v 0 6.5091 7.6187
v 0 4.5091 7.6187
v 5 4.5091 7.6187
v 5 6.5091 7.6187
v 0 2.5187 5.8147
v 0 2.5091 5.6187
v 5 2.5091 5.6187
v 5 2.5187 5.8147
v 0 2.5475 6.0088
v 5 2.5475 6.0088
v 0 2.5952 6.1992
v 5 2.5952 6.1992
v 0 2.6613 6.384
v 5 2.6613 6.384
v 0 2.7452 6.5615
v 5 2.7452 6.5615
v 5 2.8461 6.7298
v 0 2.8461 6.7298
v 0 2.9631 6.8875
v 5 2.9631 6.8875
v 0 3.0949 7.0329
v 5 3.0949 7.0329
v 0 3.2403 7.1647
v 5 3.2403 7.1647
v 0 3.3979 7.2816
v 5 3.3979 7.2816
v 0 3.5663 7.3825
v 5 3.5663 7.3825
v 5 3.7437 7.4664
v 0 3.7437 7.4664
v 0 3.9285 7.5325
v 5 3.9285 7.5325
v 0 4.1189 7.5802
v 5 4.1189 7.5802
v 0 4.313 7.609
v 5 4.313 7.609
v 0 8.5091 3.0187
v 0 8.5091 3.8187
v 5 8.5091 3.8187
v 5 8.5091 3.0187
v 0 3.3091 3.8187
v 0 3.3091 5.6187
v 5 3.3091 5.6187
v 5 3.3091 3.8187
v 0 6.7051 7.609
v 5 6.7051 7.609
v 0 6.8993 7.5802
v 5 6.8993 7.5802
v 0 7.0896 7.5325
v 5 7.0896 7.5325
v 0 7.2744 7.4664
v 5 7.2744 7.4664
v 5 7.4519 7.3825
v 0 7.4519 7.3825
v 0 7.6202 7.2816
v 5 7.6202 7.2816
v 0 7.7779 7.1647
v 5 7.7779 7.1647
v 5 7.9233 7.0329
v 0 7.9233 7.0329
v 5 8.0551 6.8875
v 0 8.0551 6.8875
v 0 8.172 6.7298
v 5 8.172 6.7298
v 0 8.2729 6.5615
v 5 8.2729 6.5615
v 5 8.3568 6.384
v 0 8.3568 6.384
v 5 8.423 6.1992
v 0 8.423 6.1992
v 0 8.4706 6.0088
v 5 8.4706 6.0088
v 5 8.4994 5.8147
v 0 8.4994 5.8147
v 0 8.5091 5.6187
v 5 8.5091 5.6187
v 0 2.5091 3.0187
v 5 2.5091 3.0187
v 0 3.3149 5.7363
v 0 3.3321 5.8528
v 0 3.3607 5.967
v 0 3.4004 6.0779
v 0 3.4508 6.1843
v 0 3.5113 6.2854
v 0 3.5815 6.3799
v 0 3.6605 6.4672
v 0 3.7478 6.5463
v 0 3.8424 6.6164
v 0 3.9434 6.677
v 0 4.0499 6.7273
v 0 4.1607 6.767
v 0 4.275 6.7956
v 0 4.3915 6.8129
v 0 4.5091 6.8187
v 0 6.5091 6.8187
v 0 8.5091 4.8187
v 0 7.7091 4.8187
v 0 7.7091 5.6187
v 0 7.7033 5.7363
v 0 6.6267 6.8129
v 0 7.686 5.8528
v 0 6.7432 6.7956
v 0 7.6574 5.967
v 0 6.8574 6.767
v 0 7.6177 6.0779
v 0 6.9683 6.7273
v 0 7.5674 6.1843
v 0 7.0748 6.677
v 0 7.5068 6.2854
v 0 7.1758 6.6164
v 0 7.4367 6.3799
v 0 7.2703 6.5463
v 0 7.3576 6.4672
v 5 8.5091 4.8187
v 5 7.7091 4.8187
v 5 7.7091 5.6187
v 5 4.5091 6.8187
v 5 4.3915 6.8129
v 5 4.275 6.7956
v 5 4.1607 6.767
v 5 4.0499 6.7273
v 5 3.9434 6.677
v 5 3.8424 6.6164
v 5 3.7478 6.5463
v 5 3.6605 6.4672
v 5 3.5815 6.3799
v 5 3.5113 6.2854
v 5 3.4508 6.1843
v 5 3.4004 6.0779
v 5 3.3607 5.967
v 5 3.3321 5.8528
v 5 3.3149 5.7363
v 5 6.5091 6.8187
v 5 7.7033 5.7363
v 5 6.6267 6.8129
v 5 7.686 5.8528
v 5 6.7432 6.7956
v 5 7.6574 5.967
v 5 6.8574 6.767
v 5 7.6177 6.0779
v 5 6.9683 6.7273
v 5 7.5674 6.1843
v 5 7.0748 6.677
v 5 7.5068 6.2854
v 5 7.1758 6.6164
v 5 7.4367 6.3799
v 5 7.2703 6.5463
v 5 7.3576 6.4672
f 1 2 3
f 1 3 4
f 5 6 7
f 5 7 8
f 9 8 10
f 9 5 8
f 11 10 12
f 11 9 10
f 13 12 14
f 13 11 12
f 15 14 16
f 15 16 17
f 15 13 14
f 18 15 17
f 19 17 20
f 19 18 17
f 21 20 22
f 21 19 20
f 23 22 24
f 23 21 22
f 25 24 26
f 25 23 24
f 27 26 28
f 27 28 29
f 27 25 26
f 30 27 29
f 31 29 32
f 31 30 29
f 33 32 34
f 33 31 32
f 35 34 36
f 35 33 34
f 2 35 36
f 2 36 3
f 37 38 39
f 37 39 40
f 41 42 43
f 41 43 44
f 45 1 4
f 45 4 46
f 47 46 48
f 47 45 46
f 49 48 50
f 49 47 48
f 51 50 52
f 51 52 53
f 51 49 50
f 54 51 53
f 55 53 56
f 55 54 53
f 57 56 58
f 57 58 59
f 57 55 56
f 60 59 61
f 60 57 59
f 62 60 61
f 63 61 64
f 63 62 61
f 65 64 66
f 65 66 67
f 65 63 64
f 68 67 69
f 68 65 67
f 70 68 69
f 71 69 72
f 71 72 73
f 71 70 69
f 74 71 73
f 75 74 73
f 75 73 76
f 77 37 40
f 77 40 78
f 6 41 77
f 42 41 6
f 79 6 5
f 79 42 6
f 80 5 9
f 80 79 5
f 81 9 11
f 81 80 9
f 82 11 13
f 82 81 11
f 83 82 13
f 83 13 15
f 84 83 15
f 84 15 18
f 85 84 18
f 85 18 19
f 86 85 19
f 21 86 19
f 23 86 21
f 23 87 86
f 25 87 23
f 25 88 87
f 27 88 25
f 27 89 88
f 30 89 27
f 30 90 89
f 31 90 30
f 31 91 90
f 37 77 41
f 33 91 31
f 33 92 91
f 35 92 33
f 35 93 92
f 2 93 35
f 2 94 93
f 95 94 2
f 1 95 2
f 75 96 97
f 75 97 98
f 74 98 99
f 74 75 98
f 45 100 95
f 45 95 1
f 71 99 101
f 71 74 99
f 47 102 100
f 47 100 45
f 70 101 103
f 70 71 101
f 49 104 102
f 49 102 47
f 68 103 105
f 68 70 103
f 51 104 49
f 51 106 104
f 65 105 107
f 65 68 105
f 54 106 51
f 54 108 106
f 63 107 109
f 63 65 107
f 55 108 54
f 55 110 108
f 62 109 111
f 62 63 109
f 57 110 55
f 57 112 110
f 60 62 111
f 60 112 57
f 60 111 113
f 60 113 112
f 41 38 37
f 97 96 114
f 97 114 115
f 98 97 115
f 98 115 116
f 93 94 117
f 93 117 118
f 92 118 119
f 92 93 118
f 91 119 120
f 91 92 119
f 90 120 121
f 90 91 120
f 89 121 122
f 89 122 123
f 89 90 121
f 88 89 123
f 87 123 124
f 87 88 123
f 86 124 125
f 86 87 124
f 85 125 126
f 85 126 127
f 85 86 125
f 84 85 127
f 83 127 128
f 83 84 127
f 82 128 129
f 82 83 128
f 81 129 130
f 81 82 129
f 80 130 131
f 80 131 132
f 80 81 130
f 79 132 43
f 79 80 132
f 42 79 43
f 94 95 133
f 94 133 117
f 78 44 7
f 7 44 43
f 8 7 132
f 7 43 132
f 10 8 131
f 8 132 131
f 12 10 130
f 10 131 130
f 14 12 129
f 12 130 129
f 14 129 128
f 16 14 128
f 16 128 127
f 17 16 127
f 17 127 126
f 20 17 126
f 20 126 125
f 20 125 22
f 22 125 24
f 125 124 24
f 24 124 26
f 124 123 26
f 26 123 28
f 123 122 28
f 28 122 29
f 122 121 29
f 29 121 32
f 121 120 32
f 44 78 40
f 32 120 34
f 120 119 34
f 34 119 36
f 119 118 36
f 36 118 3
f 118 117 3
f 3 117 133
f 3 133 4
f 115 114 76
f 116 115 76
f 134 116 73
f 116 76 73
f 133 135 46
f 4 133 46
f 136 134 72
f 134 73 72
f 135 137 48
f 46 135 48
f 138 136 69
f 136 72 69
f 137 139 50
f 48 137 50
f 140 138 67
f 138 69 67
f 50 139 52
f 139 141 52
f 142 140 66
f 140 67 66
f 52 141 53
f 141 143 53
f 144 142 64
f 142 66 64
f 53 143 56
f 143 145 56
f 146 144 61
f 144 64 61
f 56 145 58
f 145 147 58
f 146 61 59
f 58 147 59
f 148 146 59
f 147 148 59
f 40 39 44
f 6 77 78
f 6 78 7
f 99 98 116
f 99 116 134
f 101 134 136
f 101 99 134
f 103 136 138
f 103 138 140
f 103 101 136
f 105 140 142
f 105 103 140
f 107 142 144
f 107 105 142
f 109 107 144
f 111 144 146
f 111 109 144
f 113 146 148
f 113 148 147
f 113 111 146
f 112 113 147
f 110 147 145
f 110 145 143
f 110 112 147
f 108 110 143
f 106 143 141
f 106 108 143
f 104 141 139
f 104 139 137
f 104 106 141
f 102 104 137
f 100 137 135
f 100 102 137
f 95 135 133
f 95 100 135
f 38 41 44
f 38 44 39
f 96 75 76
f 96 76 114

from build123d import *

# Parameters (mm, degrees)
EXTRUDE_1_DEPTH = 5


with BuildPart() as part:
    # Эскиз2 → Бобышка-Вытянуть1 (new body)
    with BuildSketch(Plane(origin=(0, 0, 0), x_dir=(0, 0, -1), z_dir=(1, 0, 0))):
        with BuildLine():
            Line((-3.01866618, 8.509074189), (-3.01866618, 2.509074189))
            Line((-3.01866618, 2.509074189), (-5.61866618, 2.509074189))
            ThreePointArc((-5.61866618, 2.509074189), (-7.032879742, 3.094860626), (-7.61866618, 4.509074189))
            Line((-7.61866618, 4.509074189), (-7.61866618, 6.509074189))
            ThreePointArc((-7.61866618, 6.509074189), (-7.032879742, 7.923287751), (-5.61866618, 8.509074189))
            Line((-5.61866618, 8.509074189), (-4.81866618, 8.509074189))
            Line((-4.81866618, 8.509074189), (-4.81866618, 7.709074189))
            Line((-4.81866618, 7.709074189), (-5.61866618, 7.709074189))
            ThreePointArc((-5.61866618, 7.709074189), (-6.467194317, 7.357602326), (-6.81866618, 6.509074189))
            Line((-6.81866618, 6.509074189), (-6.81866618, 4.509074189))
            ThreePointArc((-6.81866618, 4.509074189), (-6.467194317, 3.660546051), (-5.61866618, 3.309074189))
            Line((-5.61866618, 3.309074189), (-3.81866618, 3.309074189))
            Line((-3.81866618, 3.309074189), (-3.81866618, 8.509074189))
            Line((-3.81866618, 8.509074189), (-3.01866618, 8.509074189))
        make_face()
    extrude(amount=EXTRUDE_1_DEPTH)


solid = part.part
